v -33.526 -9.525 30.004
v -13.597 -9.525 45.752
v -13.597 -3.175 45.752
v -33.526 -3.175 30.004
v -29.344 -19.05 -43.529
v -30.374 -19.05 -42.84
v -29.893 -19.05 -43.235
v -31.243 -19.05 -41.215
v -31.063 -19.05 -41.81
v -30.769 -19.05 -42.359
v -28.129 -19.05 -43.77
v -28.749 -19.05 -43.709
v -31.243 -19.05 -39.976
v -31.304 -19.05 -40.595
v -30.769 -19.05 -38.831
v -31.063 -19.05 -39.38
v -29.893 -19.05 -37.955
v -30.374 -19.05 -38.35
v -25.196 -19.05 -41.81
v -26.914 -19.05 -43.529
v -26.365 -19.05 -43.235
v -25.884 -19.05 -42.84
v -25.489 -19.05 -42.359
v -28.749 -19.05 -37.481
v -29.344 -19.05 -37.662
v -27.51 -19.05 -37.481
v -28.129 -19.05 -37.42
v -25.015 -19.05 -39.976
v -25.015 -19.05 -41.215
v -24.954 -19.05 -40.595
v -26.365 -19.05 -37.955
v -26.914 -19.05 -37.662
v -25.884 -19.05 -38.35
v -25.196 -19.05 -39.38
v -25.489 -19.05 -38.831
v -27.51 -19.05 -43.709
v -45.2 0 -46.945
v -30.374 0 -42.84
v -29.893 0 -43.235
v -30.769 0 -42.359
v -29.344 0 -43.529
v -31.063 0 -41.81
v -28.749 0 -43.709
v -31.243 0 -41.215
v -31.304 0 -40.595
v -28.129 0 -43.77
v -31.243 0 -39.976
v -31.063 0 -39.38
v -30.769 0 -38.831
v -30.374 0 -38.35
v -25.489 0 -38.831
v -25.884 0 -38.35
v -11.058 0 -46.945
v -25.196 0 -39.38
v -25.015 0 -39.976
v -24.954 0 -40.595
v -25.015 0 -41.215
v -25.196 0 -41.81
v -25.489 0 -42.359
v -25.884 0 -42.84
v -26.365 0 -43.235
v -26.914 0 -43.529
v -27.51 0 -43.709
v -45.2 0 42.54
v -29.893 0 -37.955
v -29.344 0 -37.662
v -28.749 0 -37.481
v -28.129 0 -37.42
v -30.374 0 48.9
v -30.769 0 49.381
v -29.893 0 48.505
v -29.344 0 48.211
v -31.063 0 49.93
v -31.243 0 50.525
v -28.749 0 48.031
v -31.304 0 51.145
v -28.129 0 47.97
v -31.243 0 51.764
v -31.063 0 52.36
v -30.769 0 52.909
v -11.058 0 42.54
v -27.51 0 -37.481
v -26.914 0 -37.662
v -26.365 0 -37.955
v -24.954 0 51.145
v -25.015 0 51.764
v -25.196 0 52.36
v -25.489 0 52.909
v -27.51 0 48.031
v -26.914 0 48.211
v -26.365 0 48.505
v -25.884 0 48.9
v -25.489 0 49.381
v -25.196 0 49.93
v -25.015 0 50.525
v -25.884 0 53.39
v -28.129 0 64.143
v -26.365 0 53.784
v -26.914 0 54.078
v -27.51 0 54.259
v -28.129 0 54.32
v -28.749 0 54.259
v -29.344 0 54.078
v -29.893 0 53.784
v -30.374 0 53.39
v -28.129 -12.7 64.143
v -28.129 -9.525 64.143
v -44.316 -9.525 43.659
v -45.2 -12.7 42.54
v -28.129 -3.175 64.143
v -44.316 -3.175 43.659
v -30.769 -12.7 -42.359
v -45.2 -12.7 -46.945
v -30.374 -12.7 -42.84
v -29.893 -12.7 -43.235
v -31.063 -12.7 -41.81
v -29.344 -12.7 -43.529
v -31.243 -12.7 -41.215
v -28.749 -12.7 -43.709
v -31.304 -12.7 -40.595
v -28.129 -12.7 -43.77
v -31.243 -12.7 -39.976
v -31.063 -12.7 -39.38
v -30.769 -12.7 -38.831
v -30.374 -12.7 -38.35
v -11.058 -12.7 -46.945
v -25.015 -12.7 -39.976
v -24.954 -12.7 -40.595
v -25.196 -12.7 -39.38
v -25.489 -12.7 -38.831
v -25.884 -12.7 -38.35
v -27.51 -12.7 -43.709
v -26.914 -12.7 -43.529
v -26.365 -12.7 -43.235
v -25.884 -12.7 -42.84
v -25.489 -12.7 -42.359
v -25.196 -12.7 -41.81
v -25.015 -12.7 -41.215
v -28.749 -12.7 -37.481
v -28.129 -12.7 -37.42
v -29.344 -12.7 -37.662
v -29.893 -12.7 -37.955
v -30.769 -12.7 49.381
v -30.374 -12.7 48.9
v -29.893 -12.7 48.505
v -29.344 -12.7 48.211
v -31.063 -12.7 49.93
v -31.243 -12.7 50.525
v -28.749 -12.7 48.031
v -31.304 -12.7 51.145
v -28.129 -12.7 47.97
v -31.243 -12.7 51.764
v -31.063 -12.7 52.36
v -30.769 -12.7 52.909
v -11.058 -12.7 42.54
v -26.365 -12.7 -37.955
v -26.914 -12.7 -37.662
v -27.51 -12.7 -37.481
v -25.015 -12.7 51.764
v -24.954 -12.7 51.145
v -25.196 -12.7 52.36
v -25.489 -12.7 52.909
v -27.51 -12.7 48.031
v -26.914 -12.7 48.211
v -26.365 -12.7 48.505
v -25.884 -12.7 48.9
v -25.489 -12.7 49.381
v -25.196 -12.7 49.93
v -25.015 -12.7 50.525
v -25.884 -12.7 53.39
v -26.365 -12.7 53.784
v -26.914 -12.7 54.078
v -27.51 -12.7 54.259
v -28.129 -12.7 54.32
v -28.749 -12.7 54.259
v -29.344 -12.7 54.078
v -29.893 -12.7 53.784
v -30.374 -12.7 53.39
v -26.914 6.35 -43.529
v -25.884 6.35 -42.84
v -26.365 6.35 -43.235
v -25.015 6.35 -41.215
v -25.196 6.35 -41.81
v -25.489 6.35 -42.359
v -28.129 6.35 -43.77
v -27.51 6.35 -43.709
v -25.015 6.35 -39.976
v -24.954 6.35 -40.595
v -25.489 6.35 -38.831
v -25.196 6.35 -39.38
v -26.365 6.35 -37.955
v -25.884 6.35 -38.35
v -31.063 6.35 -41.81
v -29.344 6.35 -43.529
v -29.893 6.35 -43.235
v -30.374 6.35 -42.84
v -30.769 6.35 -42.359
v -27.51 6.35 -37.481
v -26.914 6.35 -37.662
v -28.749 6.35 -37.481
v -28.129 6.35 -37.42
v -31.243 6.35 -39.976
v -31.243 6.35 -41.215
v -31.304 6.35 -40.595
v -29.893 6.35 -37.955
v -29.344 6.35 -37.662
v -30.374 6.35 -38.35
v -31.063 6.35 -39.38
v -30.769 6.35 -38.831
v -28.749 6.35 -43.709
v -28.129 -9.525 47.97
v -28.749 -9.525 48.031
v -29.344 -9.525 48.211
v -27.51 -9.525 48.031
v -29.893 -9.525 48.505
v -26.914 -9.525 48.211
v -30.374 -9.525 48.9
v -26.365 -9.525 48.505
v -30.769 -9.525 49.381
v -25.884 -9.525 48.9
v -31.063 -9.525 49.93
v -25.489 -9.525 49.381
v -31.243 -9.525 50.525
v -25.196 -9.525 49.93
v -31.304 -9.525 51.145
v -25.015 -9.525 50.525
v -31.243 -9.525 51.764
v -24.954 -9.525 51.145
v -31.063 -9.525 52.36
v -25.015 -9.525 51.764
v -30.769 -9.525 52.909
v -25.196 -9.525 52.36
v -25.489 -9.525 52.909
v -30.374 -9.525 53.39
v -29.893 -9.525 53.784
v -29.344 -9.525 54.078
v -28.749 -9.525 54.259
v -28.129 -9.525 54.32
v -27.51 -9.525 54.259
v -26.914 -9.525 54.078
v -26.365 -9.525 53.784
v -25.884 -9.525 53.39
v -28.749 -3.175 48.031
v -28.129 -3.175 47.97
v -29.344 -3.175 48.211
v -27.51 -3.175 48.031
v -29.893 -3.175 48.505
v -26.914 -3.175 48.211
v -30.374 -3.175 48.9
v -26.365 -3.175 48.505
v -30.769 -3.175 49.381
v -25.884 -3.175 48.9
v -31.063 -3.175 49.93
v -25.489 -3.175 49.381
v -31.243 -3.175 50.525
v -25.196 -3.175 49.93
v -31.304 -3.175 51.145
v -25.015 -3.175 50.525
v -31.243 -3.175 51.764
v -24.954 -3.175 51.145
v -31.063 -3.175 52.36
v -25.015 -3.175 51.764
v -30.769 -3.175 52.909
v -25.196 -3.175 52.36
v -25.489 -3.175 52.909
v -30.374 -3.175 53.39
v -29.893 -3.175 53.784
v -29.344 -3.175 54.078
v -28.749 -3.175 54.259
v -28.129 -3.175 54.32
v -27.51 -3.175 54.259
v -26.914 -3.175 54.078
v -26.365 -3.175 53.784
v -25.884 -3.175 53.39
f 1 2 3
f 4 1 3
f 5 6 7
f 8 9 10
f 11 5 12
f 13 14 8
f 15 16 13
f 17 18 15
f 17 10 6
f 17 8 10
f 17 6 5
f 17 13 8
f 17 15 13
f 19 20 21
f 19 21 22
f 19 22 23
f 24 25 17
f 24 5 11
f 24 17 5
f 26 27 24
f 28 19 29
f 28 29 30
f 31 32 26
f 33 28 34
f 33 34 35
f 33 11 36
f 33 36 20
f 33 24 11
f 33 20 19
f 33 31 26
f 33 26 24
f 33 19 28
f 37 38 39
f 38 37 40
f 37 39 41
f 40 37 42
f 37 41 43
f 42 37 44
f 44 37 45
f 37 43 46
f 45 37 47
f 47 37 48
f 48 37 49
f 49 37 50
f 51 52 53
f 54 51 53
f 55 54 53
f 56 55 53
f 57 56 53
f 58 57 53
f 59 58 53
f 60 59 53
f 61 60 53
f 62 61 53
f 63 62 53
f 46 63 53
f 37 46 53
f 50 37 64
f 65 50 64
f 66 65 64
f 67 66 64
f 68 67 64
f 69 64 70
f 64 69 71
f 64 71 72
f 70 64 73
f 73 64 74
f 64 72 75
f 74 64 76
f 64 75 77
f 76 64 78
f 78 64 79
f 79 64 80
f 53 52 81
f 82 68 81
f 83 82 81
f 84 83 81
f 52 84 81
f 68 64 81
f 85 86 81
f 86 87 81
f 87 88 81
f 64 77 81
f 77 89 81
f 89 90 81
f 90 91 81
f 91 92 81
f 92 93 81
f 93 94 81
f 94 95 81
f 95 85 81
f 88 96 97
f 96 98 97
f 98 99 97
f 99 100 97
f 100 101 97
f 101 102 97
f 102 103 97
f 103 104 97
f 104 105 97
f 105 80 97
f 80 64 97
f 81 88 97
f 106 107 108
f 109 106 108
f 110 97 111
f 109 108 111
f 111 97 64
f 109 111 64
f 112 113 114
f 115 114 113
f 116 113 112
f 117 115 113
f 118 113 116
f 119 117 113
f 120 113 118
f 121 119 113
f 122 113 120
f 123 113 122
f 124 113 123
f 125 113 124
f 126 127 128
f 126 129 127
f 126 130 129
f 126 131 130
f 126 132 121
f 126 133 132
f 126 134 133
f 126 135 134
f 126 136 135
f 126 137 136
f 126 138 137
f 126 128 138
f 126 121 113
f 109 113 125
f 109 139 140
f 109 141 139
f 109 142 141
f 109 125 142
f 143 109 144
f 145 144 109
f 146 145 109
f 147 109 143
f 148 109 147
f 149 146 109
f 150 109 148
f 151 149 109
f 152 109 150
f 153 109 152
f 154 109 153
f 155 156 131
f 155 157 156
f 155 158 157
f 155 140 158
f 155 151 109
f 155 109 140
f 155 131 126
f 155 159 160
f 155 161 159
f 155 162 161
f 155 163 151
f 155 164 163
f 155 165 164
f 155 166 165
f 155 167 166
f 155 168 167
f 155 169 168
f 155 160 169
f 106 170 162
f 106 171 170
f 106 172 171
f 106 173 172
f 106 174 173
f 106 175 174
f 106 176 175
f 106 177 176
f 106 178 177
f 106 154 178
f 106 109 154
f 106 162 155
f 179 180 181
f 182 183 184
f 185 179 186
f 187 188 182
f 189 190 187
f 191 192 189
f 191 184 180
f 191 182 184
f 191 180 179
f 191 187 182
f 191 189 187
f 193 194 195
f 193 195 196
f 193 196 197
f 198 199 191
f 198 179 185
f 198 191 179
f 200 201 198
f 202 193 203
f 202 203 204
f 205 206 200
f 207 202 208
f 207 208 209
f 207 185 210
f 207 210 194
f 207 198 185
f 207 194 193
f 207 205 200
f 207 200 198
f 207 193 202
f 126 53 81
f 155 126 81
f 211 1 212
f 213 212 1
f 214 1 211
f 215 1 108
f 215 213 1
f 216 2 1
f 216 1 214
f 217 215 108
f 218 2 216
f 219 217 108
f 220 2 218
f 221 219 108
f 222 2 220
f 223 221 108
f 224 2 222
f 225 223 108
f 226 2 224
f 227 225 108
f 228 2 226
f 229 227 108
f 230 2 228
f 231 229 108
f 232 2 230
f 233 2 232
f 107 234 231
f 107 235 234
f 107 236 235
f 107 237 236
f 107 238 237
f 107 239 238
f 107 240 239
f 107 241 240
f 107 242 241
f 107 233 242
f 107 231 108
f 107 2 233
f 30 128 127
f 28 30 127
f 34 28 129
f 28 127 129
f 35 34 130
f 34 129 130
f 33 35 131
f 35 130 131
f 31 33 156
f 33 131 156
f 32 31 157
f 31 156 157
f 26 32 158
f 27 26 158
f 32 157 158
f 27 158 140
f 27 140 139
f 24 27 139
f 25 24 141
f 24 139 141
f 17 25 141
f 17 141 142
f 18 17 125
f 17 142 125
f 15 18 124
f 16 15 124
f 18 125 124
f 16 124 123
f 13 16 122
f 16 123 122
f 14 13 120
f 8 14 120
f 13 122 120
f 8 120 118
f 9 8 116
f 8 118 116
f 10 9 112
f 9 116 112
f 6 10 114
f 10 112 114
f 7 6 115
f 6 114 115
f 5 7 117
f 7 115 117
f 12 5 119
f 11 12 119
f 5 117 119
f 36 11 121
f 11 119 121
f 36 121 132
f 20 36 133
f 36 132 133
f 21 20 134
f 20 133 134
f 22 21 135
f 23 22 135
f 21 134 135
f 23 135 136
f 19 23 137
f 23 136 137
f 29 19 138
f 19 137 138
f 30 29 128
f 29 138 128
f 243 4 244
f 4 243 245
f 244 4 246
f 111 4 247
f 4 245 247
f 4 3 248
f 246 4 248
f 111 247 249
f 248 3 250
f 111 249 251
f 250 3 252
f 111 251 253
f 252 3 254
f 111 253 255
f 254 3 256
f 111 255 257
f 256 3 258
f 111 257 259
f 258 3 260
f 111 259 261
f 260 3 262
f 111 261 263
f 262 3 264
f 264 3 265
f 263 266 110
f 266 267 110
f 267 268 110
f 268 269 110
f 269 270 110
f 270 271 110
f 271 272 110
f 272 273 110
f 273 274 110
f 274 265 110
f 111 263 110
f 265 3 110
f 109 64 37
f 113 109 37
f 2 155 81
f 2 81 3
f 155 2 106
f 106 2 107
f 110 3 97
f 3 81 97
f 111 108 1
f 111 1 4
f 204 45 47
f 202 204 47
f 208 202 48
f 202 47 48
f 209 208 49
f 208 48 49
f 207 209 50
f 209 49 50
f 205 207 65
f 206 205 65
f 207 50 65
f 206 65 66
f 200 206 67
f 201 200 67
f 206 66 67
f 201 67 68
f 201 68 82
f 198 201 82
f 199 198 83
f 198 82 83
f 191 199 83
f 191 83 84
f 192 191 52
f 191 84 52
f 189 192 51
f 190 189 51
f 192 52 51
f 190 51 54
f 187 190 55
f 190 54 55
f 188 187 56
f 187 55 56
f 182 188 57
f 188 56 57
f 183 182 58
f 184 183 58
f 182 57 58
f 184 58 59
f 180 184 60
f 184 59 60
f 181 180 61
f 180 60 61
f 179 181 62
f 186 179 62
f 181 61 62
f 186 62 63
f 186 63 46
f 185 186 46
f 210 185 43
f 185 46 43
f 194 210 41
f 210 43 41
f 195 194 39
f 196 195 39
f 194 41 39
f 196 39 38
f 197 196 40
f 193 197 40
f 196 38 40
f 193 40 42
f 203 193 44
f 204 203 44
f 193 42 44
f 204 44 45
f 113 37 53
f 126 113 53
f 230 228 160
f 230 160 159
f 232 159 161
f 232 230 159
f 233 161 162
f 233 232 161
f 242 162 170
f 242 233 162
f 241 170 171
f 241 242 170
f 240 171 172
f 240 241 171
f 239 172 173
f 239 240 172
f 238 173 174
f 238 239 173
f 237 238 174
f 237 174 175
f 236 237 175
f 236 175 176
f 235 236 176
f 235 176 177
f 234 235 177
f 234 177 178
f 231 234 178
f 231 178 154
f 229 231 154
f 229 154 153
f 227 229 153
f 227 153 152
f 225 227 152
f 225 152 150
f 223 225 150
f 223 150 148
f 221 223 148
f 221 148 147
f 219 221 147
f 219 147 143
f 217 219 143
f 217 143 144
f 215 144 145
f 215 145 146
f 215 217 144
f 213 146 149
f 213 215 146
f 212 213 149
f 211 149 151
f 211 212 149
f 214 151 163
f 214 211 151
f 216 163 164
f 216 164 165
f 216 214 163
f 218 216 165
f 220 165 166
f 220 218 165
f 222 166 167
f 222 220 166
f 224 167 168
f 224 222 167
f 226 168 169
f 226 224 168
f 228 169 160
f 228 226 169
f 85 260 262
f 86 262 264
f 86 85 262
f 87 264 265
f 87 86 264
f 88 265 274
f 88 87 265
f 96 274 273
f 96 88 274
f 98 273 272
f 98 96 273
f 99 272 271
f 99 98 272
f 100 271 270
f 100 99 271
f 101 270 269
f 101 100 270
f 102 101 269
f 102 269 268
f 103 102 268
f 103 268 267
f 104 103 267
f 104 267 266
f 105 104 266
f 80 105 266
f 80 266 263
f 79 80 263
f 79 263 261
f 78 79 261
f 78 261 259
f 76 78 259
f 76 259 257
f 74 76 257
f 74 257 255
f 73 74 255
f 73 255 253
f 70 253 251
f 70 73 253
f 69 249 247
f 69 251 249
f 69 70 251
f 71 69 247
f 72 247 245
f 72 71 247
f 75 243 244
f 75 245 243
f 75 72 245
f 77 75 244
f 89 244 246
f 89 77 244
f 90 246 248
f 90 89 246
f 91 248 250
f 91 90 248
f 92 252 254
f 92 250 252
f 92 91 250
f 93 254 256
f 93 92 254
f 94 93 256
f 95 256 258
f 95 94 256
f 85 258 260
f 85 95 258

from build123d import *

# Parameters (mm, degrees)
F0_R     = 3.175
F1_DEPTH = 12.7
F2_W     = 6.35
F2_H     = 23.4397758459
F3_DEPTH = 25.4
F4_R     = 3.175
F6_DEPTH = 6.35
F5_R     = 3.175
F7_DEPTH = 6.35


with BuildPart() as f1:
    # F0 (on Front) → F1 (new body)
    with BuildSketch(Plane.XZ):
        Polygon((-11.0584168369, 42.5397964036), (-28.1292907894, 64.142785233), (-45.2001647418, 42.5397964036), (-45.2001647418, -46.9452900396), (-11.0584168369, -46.9452900396), align=None)
        with Locations((-28.1292907894, 51.1445705025)):
            Circle(F0_R, mode=Mode.SUBTRACT)
    extrude(amount=F1_DEPTH)

    # F2 (on face) → F3 (cut)
    with BuildSketch(Plane(origin=(13.886044542, 0, 10.9728759269), x_dir=(0, 1, 0), z_dir=(0.7846021358, 0, 0.6199995875))):
        with Locations((-6.35, 56.046827053)):
            Rectangle(F2_W, F2_H)
    extrude(amount=-F3_DEPTH, mode=Mode.SUBTRACT)

    # F4 (on face) → F6 (join)
    with BuildSketch(Plane(origin=(0, 0, 0), x_dir=(-1, 0, 0), z_dir=(0, 1, 0))):
        with Locations((28.1292907894, -40.5952900396)):
            Circle(F4_R)
    extrude(amount=F6_DEPTH)

    # F5 (on face) → F7 (join)
    with BuildSketch(Plane.XZ.offset(12.7)):
        with Locations((-28.1292907894, -40.5952900396)):
            Circle(F5_R)
    extrude(amount=F7_DEPTH)


solid = f1.part
